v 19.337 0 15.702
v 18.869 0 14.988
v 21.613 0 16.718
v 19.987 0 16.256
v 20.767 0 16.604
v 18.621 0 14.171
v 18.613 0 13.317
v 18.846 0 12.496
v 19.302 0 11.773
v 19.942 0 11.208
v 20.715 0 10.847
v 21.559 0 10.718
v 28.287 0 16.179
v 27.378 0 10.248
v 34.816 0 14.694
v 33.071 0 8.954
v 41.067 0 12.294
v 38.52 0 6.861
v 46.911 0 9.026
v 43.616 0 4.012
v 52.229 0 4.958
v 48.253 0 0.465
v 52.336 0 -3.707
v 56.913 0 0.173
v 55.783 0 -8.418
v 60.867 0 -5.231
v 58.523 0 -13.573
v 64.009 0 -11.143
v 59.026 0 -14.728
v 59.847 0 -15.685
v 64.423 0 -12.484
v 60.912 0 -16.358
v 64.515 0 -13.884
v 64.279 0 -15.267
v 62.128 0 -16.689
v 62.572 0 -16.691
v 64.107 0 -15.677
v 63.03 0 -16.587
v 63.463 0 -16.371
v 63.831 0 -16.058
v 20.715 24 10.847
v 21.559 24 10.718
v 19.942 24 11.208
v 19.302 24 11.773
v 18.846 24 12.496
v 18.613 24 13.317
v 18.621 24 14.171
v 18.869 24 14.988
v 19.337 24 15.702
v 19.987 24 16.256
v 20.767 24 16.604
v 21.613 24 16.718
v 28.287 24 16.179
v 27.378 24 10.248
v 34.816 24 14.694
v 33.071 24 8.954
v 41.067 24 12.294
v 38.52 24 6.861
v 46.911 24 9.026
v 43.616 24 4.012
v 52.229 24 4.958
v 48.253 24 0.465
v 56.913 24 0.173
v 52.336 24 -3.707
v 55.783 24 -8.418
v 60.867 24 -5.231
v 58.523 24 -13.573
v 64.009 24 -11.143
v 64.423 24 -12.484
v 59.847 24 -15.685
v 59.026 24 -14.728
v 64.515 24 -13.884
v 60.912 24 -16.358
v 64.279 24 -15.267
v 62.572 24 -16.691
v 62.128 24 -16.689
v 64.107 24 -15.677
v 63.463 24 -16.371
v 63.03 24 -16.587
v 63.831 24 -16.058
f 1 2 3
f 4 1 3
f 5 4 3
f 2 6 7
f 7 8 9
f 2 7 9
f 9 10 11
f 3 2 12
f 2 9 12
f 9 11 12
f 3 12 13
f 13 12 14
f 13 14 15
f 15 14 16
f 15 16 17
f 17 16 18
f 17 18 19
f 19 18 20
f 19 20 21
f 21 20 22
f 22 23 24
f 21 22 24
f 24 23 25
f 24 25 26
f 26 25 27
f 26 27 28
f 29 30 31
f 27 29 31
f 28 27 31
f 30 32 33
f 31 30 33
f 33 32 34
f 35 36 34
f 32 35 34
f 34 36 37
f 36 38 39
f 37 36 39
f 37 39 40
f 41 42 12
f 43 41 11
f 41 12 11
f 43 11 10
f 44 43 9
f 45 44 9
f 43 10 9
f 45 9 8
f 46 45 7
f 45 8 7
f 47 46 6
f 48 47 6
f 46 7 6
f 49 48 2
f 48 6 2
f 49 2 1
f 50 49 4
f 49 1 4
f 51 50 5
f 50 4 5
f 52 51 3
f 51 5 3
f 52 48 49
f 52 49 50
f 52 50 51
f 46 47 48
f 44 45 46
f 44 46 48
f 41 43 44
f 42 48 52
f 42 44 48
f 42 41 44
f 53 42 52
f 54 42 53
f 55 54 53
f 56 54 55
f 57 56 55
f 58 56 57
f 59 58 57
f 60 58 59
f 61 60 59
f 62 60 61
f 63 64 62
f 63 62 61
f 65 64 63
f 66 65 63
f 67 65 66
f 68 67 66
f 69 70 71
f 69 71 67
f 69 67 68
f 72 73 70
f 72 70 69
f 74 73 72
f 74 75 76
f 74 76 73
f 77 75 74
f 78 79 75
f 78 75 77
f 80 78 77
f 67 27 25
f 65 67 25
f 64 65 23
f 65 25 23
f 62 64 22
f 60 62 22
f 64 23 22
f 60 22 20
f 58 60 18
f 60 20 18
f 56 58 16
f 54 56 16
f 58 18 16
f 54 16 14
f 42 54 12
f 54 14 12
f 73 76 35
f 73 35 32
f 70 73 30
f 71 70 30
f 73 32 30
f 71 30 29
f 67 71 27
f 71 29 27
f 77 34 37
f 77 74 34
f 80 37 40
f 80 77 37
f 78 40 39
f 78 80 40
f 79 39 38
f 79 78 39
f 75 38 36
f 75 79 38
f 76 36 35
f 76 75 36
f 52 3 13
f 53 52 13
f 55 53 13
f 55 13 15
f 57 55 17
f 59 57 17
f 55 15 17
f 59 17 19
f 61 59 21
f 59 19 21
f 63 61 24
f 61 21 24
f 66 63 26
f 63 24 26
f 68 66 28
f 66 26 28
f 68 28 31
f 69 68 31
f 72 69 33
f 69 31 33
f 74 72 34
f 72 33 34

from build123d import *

# Parameters (mm, degrees)
BOSS_EXTRUDE2_DEPTH = 24
FILLET3_R           = 2


with BuildPart() as part:
    # Sketch2 → Boss-Extrude2 (new body)
    with BuildSketch(Plane(origin=(0, 0, 0), x_dir=(1, 0, 0), z_dir=(0, 1, 0))):
        with BuildLine():
            ThreePointArc((64.008898715, 11.143267641), (64.514374858, 13.892879926), (63.719057289, 16.573056006))
            ThreePointArc((63.719057289, 16.573056006), (60.499660734, 16.149214409), (58.522904866, 13.573056006))
            ThreePointArc((58.522904866, 13.573056006), (43.615754555, -4.011786119), (21.55946325, -10.71773995))
            ThreePointArc((21.55946325, -10.71773995), (18.586355818, -13.744393581), (21.613009449, -16.717501013))
            ThreePointArc((21.613009449, -16.717501013), (46.910872497, -9.025985731), (64.008898715, 11.143267641))
        make_face()
    extrude(amount=BOSS_EXTRUDE2_DEPTH)

    # Fillet3
    fillet3_edges = [part.edges().sort_by_distance(p)[0] for p in [
        (63.719057289, 12, -16.573056006),
    ]]
    fillet(fillet3_edges, radius=FILLET3_R)


solid = part.part
